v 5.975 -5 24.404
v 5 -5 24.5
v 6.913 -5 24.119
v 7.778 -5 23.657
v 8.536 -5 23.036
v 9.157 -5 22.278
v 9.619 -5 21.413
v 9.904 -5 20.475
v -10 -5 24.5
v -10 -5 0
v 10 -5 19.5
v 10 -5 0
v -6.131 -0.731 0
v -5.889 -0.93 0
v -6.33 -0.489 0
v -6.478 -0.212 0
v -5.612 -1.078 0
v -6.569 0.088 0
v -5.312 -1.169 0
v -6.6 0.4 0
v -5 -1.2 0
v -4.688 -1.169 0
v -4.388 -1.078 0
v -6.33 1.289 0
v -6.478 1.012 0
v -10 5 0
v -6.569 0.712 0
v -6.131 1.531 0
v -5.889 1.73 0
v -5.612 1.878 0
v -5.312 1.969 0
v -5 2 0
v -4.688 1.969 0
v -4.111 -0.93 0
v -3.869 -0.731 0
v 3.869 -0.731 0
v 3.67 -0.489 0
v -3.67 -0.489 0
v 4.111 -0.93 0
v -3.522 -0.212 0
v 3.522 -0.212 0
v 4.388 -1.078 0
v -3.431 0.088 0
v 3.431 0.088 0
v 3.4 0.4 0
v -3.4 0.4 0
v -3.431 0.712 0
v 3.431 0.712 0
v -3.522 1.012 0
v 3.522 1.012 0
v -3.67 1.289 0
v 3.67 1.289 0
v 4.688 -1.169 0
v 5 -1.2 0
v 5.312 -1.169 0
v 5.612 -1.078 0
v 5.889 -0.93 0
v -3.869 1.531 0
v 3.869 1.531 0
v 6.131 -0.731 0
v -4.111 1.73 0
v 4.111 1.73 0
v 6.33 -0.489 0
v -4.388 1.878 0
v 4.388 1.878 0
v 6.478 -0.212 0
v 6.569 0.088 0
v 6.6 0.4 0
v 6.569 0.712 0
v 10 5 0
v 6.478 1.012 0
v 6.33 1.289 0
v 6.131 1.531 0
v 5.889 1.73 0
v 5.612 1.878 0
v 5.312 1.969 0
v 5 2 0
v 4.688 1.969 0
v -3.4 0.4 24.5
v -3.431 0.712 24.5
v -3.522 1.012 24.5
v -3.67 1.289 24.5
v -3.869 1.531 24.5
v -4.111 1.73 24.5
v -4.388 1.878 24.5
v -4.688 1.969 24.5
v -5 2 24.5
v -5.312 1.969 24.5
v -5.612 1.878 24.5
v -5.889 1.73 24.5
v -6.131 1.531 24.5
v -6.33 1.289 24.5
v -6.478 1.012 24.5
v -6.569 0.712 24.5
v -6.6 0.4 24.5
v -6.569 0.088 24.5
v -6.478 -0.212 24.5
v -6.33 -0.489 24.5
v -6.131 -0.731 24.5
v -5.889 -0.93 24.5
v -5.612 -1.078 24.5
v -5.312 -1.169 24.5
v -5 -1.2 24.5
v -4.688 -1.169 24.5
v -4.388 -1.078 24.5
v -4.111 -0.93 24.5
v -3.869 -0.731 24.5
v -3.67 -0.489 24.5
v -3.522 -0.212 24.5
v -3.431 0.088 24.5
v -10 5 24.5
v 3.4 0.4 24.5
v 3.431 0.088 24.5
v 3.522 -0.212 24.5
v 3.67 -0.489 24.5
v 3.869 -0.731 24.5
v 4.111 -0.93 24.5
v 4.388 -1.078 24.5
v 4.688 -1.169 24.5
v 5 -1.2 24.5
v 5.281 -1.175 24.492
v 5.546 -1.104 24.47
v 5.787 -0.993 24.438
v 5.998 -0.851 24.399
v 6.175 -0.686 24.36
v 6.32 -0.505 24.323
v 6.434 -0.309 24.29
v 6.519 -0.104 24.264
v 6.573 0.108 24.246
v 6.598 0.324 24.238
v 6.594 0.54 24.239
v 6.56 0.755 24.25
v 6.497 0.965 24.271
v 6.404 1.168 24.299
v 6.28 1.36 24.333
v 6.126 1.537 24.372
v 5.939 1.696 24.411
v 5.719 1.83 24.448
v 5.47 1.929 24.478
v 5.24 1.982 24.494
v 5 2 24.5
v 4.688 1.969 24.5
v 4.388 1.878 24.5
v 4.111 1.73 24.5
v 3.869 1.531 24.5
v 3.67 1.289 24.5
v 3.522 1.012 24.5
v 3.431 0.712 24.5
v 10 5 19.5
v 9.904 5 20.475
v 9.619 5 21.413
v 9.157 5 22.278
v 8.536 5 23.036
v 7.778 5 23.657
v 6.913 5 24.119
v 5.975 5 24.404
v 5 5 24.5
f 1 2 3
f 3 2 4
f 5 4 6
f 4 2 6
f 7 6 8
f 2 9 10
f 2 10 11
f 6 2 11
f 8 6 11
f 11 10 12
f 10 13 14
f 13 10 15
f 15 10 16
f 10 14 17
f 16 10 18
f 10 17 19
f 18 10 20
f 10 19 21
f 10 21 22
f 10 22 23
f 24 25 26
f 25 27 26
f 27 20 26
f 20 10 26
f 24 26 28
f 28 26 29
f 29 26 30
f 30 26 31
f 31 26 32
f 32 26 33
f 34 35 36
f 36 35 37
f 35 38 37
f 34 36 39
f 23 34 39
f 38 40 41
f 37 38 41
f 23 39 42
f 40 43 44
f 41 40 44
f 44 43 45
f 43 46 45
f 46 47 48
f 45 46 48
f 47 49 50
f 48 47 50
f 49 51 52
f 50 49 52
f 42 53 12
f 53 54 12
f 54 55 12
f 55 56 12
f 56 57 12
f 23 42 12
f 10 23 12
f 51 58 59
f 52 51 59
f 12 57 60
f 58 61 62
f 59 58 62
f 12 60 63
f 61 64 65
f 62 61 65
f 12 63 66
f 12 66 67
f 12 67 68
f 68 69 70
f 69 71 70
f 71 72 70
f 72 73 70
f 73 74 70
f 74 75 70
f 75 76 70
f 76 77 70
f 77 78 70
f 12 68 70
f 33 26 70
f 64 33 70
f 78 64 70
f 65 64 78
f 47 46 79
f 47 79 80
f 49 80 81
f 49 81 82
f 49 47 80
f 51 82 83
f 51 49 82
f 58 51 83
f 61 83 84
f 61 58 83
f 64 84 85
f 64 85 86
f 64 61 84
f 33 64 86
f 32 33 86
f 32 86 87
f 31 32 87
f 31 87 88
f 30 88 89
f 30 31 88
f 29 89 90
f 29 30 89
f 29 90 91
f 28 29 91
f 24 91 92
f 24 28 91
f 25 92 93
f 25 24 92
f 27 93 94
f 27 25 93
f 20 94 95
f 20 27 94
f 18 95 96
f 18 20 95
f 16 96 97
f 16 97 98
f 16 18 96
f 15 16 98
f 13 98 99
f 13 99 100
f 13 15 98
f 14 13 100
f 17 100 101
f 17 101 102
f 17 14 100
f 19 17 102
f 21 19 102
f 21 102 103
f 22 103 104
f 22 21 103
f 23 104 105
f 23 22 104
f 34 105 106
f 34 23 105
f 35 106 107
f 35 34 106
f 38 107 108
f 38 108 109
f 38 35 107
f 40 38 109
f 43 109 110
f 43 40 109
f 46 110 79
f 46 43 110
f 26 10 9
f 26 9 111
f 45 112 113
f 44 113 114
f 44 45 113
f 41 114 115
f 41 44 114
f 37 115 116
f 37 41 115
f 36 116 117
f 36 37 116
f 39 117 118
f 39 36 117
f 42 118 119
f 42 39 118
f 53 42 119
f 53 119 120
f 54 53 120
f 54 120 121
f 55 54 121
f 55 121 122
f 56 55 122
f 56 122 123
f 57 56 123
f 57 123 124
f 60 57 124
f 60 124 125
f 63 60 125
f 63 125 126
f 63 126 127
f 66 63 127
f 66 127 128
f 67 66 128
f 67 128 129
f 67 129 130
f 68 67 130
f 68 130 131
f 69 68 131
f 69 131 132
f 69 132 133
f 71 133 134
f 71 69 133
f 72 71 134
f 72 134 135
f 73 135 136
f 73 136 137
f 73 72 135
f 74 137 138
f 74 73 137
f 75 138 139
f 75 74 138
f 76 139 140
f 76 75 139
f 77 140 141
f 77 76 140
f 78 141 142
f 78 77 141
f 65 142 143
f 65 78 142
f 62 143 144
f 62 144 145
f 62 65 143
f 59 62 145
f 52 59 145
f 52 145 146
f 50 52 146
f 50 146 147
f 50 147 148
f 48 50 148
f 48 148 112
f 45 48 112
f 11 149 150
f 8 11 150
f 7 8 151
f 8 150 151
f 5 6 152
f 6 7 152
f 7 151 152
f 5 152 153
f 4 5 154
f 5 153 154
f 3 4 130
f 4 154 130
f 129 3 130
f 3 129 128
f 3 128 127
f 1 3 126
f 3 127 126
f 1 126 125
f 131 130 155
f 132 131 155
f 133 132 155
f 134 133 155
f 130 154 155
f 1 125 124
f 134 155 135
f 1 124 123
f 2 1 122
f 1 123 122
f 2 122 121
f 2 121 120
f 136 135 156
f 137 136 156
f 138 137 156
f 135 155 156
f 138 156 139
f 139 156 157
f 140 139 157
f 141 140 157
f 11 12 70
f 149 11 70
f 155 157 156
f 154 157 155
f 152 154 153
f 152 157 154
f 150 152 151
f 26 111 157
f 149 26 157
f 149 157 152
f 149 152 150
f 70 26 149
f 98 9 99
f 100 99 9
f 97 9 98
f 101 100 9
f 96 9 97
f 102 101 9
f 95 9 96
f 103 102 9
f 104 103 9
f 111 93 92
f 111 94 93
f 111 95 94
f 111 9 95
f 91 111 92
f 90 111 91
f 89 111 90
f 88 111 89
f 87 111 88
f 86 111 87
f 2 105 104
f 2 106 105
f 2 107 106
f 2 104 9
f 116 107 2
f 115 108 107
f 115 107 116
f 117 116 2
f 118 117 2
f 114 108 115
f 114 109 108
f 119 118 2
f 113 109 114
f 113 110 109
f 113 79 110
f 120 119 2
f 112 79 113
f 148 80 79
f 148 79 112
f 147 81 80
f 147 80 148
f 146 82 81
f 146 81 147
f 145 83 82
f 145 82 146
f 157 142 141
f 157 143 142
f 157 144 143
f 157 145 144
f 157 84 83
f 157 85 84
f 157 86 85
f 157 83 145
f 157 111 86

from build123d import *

# Parameters (mm, degrees)
SKETCH_1_W      = 20
SKETCH_1_H      = 10
SKETCH_1_R      = 1.6
EXTRUDE_1_DEPTH = 24.5
FILLET_1_R      = 5


with BuildPart() as part:
    # ｽｹｯﾁ1 → ﾎﾞｽ - 押し出し1 (new body)
    with BuildSketch(Plane.XY):
        Rectangle(SKETCH_1_W, SKETCH_1_H)
        with Locations((-5, 0.4)):
            Circle(SKETCH_1_R, mode=Mode.SUBTRACT)
        with Locations(Location((5, 0.4, 0), (0, 0, 180))):
            Circle(SKETCH_1_R, mode=Mode.SUBTRACT)
    extrude(amount=EXTRUDE_1_DEPTH)

    # ﾌｨﾚｯﾄ1
    # the kernel refuses this fillet: 5 mm, written as the material it takes off along each edge
    with BuildSketch(Plane(origin=(10, 17.5, 24.5), x_dir=(0, 0, -1), z_dir=(0, -1, 0))) as fillet_1_piece_1:
        with BuildLine():
            CenterArc((FILLET_1_R, -FILLET_1_R), FILLET_1_R, 90, 90)
            Line((0, -FILLET_1_R), (0, 0))
            Line((0, 0), (FILLET_1_R, 0))
        make_face()
    extrude(amount=35, mode=Mode.SUBTRACT)


solid = part.part
